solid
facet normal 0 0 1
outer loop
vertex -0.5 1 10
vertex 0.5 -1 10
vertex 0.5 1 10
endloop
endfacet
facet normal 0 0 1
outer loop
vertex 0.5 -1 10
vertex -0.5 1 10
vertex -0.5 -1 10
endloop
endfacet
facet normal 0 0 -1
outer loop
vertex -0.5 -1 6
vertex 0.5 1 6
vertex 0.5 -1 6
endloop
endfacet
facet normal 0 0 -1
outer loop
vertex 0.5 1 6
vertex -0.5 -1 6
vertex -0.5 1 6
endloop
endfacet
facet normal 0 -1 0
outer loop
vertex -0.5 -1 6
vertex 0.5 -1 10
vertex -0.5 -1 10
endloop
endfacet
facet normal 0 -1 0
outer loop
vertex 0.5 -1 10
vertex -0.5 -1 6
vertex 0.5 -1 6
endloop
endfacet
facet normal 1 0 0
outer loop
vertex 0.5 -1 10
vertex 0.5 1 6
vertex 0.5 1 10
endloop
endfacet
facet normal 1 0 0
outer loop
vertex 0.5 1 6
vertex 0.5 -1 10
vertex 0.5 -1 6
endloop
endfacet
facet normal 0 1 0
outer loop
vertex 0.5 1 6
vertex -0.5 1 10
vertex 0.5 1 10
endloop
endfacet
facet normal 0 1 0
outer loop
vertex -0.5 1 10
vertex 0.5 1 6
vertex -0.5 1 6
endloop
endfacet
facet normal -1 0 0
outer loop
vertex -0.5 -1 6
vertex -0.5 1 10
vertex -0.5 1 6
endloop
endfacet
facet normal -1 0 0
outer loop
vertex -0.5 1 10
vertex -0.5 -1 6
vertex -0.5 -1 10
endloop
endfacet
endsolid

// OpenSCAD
translate([0.0, 0.0, 8.0]) {
    cube(size=[1.0, 2.0, 4.0], center=true);
};
